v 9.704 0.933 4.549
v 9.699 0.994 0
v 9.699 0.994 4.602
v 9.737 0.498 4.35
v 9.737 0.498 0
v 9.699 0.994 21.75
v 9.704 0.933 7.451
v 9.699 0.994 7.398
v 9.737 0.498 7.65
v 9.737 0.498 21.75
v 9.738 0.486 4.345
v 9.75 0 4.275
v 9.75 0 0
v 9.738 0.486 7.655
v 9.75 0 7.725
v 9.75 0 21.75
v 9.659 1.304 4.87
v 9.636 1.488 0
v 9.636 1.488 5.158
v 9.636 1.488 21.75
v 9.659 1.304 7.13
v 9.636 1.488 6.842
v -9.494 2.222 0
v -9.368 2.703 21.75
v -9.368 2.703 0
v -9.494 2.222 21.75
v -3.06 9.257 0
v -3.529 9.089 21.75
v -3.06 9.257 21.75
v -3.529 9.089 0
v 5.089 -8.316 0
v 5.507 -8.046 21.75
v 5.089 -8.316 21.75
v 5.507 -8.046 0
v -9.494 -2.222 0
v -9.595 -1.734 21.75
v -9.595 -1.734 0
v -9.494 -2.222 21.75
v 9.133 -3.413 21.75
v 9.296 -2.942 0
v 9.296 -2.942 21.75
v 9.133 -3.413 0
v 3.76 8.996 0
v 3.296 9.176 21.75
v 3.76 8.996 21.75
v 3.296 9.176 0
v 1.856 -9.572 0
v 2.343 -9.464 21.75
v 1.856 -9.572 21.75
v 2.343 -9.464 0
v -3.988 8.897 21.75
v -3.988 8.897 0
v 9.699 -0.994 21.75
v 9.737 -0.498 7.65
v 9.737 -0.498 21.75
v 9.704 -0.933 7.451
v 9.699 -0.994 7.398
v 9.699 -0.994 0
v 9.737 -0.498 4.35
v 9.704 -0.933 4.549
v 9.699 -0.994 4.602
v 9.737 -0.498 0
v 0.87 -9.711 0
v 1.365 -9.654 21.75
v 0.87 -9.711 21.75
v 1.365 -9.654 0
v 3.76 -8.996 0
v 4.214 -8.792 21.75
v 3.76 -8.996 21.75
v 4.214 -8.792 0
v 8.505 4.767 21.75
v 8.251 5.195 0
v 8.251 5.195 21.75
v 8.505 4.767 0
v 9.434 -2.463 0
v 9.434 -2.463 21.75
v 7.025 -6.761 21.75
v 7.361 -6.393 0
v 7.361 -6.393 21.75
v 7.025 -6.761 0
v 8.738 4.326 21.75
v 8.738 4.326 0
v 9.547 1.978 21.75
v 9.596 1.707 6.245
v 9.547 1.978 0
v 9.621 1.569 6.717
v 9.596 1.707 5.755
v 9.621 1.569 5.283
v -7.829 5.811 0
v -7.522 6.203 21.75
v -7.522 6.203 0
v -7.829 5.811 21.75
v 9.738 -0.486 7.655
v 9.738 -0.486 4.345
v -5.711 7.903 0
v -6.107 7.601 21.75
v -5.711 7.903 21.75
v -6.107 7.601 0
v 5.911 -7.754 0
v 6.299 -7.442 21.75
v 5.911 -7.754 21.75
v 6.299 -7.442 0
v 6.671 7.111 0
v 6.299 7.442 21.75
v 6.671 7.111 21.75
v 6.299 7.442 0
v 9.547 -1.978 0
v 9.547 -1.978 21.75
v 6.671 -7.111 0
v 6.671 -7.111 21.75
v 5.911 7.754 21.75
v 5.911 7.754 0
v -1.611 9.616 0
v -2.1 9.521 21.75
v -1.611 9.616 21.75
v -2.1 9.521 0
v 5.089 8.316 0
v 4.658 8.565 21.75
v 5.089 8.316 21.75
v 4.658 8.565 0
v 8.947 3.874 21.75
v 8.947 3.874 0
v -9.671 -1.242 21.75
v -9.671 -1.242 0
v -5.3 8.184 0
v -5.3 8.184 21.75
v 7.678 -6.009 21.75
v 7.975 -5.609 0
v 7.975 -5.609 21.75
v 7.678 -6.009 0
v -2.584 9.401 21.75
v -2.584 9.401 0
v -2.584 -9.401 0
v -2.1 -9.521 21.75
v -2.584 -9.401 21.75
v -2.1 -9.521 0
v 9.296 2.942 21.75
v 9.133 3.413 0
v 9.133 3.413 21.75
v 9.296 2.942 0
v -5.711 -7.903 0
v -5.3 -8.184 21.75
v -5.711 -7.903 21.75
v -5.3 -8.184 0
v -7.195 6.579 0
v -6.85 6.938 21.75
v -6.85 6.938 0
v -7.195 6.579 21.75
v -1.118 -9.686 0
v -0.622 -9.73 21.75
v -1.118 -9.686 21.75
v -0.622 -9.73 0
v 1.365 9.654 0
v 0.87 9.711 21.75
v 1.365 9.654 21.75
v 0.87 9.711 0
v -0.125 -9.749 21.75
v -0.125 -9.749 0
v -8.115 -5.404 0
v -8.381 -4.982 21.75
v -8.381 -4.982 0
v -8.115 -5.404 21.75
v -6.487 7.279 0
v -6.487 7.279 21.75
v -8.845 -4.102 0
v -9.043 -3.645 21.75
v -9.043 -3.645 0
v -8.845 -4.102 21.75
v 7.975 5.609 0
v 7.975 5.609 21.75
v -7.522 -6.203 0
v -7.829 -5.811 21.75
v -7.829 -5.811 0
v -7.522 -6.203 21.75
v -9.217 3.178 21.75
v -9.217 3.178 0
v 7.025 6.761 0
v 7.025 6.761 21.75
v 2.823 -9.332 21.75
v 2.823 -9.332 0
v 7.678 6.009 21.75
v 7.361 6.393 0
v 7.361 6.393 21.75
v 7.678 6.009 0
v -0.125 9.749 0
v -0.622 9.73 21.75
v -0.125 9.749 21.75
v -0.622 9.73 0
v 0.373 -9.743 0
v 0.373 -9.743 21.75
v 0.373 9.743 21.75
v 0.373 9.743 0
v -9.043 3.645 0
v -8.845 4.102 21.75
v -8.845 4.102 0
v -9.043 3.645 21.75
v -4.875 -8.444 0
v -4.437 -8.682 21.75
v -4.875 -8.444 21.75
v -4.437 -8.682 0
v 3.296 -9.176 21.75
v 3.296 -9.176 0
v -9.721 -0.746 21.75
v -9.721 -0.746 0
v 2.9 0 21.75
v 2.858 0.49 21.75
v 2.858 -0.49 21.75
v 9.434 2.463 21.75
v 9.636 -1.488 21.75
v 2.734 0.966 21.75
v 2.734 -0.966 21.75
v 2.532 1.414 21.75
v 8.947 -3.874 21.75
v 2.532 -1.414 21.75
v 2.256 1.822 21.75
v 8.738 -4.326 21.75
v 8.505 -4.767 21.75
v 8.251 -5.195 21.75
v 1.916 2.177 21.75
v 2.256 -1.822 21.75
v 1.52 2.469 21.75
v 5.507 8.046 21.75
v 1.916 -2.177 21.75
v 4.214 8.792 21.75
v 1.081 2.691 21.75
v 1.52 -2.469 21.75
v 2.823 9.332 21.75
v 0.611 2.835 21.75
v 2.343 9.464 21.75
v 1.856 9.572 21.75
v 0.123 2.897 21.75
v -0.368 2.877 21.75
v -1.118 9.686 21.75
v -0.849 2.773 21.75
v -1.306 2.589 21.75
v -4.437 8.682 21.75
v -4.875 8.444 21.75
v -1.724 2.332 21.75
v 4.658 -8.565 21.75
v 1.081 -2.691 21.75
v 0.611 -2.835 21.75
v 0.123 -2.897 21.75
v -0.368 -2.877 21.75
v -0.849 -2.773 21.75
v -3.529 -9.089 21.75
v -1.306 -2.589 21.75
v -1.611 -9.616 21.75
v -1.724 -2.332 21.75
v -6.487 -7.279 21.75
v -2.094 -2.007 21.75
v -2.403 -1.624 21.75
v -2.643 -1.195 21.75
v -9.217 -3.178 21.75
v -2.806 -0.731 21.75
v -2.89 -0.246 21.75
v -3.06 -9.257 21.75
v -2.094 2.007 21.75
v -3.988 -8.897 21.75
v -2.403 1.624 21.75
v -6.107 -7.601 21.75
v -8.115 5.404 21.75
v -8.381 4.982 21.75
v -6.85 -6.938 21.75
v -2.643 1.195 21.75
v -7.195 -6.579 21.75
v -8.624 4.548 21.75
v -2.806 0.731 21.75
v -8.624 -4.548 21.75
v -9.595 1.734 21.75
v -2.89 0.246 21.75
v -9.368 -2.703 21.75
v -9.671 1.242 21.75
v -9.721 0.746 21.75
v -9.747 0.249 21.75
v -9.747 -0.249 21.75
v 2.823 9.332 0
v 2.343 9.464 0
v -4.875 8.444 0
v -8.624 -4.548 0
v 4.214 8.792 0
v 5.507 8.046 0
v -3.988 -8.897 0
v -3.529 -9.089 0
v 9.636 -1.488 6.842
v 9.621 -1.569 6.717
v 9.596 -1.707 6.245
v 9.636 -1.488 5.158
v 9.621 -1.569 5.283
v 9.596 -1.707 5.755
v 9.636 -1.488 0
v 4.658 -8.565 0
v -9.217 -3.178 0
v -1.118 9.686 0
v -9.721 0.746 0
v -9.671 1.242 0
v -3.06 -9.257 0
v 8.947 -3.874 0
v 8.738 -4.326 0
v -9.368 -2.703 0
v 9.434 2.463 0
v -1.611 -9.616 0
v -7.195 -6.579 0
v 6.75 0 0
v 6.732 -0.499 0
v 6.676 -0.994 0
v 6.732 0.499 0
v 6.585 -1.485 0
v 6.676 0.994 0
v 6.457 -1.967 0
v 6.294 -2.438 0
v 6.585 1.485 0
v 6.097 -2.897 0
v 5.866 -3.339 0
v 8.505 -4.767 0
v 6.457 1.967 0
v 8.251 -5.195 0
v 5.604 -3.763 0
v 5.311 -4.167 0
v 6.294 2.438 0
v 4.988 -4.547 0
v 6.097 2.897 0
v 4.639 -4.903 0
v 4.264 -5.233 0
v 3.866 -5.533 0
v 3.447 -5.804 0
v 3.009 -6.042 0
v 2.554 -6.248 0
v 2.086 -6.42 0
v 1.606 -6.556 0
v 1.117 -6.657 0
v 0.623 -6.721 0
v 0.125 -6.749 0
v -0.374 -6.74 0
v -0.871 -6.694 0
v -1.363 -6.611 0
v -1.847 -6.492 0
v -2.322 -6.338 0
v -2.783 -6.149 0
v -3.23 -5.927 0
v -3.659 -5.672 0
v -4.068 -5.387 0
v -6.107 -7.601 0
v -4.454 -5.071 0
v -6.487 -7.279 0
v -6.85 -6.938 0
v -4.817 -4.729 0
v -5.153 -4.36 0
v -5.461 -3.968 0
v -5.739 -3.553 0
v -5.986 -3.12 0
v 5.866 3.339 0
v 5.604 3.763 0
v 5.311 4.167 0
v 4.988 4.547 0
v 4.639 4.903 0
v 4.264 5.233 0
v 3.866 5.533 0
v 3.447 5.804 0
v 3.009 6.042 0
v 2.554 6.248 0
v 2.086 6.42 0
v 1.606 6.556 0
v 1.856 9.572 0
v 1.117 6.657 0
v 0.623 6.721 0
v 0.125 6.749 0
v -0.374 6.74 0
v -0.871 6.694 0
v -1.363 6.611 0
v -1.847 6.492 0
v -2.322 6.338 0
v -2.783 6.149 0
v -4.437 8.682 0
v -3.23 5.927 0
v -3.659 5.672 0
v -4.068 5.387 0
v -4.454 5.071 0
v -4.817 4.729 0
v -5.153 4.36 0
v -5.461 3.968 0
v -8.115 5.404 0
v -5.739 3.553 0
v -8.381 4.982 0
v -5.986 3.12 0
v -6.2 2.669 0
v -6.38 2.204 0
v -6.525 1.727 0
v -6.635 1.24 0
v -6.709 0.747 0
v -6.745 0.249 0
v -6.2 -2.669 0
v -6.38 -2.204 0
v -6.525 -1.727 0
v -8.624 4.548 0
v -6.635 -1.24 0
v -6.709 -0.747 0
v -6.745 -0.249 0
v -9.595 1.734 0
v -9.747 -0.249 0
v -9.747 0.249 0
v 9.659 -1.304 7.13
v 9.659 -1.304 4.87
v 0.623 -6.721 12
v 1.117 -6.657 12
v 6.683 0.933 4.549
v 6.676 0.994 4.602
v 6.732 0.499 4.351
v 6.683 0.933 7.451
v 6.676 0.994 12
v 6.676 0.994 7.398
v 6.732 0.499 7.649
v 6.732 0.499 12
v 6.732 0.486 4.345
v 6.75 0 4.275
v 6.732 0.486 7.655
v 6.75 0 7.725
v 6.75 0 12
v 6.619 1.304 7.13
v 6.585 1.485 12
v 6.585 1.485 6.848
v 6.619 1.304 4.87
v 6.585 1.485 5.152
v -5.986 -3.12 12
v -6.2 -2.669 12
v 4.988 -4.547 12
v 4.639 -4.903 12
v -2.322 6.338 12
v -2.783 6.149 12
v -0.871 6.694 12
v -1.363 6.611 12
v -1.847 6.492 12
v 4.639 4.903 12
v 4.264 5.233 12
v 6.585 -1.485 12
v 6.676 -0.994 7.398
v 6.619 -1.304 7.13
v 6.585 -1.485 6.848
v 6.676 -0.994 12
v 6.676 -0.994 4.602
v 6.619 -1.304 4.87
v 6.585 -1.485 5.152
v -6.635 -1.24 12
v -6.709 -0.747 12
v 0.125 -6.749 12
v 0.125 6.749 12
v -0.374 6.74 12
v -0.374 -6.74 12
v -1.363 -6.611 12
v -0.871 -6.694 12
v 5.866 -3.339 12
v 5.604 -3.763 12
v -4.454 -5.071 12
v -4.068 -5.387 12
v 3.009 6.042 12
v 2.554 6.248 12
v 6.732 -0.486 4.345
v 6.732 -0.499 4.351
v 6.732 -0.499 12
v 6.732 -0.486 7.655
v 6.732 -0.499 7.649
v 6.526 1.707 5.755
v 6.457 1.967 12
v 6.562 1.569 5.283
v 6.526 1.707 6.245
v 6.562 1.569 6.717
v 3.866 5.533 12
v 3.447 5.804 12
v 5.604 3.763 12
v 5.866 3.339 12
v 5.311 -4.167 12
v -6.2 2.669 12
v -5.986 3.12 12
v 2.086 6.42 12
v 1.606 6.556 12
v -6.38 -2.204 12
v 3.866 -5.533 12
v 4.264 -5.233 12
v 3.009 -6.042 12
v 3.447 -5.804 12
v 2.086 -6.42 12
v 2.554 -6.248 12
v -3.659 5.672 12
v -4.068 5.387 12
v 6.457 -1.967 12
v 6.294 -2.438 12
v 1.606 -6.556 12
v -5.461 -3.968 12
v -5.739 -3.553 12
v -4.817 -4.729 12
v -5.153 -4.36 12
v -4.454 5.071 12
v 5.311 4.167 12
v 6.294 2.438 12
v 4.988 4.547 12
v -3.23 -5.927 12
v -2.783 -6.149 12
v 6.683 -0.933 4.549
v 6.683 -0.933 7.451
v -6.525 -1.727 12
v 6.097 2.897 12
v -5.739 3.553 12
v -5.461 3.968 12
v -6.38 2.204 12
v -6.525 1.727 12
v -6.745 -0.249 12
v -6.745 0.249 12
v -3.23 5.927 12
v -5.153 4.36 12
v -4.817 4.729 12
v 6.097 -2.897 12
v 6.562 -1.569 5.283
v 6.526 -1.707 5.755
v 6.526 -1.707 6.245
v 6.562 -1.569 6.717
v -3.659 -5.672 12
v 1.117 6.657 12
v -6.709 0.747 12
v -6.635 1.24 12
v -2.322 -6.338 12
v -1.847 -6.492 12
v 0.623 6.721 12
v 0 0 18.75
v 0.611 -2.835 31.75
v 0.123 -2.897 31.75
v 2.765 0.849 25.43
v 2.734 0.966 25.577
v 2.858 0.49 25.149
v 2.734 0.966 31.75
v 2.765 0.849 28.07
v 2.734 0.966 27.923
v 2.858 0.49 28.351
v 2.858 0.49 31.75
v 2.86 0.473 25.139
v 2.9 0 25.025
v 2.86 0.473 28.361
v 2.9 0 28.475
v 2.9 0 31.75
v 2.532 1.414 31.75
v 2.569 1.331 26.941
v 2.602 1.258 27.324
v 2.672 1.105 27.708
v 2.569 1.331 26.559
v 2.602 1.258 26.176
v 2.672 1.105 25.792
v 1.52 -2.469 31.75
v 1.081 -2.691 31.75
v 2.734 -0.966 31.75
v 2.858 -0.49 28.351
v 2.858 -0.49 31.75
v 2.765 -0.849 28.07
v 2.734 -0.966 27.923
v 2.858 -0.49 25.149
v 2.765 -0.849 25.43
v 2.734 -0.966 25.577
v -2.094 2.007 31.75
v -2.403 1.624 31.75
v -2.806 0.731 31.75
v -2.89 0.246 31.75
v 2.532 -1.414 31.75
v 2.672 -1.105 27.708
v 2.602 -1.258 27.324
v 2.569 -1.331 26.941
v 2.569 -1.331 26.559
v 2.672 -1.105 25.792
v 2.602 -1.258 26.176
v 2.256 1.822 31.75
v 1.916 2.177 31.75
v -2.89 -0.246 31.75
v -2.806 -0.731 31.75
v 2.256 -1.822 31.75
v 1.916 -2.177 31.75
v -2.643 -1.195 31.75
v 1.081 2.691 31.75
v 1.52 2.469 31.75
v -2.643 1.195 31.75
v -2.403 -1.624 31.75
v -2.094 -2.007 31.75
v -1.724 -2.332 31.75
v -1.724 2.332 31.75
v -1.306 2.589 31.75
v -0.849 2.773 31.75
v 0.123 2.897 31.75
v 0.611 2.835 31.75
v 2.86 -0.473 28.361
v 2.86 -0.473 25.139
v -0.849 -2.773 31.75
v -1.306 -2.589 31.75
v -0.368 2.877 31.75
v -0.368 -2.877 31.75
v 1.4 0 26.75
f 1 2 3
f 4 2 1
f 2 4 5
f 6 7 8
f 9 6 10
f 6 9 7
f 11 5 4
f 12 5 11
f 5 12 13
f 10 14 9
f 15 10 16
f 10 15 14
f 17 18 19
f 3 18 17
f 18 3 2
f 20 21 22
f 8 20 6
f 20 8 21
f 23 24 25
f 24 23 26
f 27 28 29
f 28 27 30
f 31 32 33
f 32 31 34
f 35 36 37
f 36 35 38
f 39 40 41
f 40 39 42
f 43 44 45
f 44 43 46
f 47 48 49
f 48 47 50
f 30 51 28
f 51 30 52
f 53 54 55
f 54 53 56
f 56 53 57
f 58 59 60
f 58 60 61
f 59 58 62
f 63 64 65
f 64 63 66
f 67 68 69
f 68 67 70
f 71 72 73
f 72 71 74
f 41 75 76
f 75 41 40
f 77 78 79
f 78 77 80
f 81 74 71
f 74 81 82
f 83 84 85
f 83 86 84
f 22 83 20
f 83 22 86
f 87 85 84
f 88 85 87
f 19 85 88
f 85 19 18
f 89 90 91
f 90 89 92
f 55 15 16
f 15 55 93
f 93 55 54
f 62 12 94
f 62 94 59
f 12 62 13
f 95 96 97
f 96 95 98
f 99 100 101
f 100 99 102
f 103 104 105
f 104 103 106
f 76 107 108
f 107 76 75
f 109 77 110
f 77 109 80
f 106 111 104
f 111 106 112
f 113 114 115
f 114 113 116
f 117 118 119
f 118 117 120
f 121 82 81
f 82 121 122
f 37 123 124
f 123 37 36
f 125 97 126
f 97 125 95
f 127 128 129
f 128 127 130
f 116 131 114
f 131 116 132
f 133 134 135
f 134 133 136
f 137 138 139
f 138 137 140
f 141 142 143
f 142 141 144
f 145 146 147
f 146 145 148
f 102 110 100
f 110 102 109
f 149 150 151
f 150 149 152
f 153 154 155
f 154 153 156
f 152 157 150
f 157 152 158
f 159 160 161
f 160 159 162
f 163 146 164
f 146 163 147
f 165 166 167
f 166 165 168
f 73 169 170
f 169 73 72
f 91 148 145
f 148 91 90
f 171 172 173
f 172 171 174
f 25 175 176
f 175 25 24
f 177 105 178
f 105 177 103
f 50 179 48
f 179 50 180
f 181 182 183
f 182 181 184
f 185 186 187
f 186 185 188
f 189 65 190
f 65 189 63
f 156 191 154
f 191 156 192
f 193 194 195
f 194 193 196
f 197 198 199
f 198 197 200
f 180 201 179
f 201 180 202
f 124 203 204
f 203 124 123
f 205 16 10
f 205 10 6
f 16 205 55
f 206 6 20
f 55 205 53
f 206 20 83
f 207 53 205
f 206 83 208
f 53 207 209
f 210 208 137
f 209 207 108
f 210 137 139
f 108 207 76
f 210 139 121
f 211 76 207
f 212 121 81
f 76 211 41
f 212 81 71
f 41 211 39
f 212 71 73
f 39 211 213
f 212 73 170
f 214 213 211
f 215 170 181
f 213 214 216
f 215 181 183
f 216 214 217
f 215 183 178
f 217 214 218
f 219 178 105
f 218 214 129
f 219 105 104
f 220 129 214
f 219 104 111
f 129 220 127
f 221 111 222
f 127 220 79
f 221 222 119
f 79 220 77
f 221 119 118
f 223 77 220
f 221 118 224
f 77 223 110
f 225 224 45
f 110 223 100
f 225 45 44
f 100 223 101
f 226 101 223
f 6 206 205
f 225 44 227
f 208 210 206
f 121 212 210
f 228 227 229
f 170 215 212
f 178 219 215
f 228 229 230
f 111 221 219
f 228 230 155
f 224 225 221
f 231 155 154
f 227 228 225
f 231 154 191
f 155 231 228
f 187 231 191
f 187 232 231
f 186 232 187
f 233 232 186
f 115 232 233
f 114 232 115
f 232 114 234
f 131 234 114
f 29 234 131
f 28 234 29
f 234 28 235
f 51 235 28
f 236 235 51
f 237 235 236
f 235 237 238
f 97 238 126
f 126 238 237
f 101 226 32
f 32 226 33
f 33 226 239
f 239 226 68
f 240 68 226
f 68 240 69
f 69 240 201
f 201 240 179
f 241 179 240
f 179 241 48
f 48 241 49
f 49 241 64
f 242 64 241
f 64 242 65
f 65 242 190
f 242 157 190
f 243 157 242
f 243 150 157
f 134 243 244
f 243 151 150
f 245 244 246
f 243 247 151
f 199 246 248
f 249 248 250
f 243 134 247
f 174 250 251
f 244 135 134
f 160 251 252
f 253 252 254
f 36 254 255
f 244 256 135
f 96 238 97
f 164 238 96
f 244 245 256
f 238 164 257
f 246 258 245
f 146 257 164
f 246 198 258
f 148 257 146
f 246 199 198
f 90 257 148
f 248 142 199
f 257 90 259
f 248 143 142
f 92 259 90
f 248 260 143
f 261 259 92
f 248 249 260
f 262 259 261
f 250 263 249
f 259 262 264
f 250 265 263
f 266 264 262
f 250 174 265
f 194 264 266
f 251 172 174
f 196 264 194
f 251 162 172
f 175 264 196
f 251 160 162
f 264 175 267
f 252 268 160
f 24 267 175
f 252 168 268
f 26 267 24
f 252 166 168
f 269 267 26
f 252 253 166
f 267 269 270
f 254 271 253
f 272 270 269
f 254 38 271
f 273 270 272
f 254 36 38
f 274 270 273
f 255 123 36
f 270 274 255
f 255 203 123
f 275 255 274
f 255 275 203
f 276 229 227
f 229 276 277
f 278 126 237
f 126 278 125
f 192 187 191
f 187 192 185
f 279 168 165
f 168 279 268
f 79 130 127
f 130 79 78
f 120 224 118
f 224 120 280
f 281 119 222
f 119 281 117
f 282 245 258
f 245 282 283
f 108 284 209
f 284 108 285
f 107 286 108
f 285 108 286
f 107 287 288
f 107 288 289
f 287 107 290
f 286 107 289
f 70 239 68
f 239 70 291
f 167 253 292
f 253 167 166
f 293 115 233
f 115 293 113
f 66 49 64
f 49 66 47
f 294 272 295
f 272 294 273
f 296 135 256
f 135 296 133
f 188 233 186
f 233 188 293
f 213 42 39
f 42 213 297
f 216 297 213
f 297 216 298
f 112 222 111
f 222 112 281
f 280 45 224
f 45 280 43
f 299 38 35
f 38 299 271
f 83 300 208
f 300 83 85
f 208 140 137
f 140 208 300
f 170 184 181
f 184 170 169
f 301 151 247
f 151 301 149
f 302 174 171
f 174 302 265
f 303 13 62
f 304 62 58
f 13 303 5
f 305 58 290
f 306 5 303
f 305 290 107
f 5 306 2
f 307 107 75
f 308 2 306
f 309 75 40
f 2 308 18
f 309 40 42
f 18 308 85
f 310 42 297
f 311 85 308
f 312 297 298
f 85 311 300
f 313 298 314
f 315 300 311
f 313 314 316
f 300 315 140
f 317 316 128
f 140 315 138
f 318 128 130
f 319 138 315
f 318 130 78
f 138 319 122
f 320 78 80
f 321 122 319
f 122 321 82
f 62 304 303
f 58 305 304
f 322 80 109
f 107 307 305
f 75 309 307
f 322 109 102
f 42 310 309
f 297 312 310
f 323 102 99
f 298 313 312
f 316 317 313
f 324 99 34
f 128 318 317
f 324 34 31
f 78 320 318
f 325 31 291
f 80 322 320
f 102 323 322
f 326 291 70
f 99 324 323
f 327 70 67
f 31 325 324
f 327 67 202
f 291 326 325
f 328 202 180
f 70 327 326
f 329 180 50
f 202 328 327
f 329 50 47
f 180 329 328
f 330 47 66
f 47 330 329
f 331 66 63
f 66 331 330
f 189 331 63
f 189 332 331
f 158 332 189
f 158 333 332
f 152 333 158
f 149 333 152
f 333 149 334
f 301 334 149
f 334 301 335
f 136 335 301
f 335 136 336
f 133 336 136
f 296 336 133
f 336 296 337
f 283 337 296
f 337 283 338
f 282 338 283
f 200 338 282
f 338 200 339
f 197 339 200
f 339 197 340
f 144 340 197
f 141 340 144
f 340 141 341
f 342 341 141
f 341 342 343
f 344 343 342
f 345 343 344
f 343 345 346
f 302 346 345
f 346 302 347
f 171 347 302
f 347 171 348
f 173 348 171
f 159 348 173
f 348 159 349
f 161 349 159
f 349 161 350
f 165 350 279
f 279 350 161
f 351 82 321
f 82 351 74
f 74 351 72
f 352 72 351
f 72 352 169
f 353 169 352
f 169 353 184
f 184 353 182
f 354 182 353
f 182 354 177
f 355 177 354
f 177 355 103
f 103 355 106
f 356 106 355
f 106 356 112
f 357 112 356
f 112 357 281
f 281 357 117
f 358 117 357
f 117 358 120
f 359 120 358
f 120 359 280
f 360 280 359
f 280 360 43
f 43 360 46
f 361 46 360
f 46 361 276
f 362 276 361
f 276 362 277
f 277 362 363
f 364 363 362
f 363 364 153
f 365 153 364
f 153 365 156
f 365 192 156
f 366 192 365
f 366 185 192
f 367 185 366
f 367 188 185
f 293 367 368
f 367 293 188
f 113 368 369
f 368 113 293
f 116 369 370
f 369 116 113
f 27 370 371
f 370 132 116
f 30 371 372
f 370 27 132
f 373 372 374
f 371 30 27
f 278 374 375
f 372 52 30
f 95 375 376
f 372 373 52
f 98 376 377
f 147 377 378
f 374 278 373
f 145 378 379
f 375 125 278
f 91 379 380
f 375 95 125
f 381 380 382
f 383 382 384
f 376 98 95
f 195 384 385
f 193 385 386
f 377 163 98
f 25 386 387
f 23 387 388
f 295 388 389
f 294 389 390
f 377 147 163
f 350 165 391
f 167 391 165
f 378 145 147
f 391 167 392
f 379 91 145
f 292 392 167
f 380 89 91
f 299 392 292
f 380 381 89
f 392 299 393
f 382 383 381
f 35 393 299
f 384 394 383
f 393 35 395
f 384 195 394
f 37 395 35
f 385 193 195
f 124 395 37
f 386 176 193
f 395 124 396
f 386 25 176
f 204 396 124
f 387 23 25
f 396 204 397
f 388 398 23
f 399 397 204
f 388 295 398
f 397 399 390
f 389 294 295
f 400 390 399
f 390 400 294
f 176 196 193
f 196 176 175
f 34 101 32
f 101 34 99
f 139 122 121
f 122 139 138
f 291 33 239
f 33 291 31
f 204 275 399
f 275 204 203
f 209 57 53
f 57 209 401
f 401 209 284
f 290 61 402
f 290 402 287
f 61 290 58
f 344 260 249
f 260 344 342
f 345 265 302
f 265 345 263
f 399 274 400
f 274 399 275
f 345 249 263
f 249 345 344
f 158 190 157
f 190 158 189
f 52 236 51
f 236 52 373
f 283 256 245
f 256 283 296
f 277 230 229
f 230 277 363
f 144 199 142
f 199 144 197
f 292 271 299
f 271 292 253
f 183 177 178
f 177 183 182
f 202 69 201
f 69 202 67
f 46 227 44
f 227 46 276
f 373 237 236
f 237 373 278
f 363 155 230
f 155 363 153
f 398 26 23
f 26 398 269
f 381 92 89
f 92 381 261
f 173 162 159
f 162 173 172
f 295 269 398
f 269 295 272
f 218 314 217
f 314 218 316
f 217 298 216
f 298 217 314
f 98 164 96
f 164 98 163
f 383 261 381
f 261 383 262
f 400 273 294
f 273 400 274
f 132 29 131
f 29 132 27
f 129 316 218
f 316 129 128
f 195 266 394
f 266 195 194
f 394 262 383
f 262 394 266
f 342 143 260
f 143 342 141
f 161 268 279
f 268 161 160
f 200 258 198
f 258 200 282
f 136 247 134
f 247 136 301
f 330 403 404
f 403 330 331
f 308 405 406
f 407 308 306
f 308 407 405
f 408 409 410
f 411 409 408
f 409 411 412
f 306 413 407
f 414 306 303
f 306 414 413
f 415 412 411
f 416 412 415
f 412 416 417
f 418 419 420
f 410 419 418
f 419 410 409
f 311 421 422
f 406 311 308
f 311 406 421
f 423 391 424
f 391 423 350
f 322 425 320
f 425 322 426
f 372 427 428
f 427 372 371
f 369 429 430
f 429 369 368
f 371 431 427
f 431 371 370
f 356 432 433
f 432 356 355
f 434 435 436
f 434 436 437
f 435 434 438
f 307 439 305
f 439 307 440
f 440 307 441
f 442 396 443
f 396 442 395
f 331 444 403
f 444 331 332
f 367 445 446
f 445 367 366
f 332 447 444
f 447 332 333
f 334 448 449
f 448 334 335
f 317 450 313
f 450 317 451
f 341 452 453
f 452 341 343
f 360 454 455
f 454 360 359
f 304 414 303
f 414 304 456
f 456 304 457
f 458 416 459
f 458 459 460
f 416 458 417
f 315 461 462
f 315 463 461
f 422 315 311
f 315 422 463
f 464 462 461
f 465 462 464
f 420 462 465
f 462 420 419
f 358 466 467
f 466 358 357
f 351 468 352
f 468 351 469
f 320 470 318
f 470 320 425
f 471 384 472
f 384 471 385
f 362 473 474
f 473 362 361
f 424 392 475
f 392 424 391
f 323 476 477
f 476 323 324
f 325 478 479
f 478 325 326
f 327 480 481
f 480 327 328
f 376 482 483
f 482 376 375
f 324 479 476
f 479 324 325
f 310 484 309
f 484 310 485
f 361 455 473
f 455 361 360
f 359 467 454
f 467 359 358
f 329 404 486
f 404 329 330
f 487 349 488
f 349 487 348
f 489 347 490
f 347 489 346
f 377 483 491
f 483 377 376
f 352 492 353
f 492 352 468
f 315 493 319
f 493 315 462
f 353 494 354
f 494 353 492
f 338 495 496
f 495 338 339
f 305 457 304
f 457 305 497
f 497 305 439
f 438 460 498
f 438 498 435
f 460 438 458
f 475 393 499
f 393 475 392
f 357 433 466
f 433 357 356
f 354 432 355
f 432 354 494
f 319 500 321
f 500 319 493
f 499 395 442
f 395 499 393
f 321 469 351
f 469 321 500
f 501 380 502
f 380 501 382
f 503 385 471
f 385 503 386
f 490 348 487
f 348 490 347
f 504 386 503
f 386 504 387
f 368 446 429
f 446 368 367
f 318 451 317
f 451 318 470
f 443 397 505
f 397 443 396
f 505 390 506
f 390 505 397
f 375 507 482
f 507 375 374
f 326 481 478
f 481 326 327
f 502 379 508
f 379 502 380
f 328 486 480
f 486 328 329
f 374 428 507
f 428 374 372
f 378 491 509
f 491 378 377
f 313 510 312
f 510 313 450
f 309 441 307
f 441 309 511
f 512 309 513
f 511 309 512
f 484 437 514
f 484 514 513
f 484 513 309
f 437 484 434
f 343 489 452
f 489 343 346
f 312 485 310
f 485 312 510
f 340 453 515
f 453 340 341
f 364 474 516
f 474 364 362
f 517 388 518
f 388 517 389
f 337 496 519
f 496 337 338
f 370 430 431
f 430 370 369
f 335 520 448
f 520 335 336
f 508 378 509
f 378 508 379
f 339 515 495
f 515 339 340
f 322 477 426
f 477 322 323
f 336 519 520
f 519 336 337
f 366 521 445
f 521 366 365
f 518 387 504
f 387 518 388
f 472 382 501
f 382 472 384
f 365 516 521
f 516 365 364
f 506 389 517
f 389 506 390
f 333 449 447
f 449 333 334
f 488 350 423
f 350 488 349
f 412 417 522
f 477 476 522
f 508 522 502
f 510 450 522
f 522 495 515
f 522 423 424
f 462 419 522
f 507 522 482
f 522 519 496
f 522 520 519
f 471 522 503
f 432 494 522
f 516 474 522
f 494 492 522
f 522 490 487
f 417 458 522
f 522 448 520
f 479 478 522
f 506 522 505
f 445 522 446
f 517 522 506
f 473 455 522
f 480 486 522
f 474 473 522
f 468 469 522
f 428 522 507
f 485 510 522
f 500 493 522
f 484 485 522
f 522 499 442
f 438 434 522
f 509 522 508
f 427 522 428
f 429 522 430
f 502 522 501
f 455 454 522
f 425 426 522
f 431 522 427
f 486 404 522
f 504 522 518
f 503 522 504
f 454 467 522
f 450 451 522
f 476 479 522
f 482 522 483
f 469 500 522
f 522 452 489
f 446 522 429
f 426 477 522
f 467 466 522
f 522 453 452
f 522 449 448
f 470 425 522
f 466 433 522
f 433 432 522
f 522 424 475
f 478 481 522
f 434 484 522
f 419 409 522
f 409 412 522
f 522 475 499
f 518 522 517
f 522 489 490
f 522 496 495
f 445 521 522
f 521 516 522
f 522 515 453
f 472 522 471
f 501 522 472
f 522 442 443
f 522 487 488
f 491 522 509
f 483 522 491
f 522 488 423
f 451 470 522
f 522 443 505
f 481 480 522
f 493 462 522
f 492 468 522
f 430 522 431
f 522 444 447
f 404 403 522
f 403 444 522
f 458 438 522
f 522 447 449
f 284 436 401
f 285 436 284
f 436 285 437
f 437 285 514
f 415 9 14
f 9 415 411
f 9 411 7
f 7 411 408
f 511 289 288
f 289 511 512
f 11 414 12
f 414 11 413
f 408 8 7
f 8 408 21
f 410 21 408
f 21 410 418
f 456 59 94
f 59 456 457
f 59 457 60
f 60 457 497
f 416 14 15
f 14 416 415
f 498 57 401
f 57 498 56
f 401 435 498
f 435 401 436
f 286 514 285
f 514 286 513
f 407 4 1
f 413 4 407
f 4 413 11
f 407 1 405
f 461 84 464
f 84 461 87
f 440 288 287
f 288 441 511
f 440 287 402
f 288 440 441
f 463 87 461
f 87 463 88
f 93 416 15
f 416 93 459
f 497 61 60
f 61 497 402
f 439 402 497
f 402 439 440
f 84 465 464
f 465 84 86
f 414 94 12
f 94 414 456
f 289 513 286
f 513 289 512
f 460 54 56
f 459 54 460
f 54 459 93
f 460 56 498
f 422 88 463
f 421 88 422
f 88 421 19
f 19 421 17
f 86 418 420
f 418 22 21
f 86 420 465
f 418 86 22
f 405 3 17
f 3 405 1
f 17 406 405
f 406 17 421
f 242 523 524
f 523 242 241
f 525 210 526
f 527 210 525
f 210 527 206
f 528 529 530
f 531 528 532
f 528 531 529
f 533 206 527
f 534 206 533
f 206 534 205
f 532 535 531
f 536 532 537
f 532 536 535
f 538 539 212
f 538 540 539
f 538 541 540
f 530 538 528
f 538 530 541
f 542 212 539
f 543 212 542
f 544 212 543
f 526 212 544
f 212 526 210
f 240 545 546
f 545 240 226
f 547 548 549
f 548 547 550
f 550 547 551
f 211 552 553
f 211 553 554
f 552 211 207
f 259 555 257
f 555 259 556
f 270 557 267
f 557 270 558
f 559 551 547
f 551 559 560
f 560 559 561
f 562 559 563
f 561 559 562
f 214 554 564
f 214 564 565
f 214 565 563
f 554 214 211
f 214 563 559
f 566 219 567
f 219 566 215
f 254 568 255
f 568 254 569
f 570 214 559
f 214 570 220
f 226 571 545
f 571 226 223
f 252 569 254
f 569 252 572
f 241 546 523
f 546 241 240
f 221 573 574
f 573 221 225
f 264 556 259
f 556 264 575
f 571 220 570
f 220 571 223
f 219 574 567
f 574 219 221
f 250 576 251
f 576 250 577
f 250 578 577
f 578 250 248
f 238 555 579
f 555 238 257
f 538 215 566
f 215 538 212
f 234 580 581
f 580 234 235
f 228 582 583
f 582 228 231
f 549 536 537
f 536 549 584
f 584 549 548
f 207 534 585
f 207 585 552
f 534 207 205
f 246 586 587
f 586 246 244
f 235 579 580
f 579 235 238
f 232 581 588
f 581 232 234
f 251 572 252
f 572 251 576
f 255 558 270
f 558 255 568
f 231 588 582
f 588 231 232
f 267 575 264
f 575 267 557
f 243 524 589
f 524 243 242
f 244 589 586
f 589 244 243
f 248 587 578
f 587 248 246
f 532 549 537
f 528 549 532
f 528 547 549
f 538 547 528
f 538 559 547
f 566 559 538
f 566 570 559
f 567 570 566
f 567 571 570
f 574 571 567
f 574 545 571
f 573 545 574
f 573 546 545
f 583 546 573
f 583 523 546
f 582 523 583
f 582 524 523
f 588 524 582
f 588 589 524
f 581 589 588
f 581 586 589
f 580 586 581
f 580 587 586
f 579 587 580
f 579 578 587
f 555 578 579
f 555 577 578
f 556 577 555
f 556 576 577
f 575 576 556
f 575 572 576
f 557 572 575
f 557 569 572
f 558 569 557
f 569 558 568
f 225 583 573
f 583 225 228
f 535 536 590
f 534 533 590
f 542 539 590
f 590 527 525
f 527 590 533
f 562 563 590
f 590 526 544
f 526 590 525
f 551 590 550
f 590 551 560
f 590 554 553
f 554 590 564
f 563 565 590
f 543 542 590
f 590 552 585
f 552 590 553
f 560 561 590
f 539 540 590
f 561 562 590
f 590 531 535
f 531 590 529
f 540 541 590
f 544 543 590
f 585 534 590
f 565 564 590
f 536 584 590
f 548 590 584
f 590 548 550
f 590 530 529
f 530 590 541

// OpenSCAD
//design and code by emanresu (http://www.thingiverse.com/Emanresu)
//makes a male to female coupling for joining two rods together
//there is a hole for a screw in the female end
//and a contact point for a screw on the mail end

//diameter of male end of the coupling (mm)
male_diam=5.8;
//length of male end of the coupling (mm)
male_h=10;
//inner diameter of female end of coupling (mm)
fem_diam=13.5;
//depth of female coupling (mm)
fem_h=12;
//screw size (mm)
screw_diam=3.45;
//how much plastic is between features, determines outer diameter of female end (mm)
thick=3;



module hide_variables() {
	// just a placeholder to hide variables from customizer
}

$fs=0.5;
$fa=1;

//radius of male end
male_rad=male_diam/2;
//radius of female end
fem_rad=fem_diam/2;

//outer surface of female end
fem_o_rad=fem_rad+thick;
fem_o_h=fem_h+thick+fem_rad;
//screw radius
screw_rad=screw_diam/2;
//depth of divot on male end
div_h=1.5;


union() {
	//female end of coupling
	difference() {
		//outer surface
		cylinder(r=fem_o_rad, h=fem_o_h, center=false);
		//inner surface
		cylinder(r=fem_rad, h=fem_h, center=false);
		translate([0, 0, fem_h]) cylinder(r1=fem_rad, r2=0, h=fem_rad, center=false);
		//screw hole
		translate([0, 0, fem_h/2]) rotate([0, 90, 0]) cylinder(r=screw_rad, h=fem_o_rad+1, center=false);
	}
	//Male end of coupling
	difference() {
		//male shaft
		translate([0, 0, fem_o_h]) cylinder(r=male_rad, h=male_h, center=false);
		//screw divot
		translate([male_rad, 0, fem_o_h+male_h/2]) rotate([0, -90, 0]) cylinder(r1=screw_rad, r2=0, h=div_h, center=false);
	}
}
